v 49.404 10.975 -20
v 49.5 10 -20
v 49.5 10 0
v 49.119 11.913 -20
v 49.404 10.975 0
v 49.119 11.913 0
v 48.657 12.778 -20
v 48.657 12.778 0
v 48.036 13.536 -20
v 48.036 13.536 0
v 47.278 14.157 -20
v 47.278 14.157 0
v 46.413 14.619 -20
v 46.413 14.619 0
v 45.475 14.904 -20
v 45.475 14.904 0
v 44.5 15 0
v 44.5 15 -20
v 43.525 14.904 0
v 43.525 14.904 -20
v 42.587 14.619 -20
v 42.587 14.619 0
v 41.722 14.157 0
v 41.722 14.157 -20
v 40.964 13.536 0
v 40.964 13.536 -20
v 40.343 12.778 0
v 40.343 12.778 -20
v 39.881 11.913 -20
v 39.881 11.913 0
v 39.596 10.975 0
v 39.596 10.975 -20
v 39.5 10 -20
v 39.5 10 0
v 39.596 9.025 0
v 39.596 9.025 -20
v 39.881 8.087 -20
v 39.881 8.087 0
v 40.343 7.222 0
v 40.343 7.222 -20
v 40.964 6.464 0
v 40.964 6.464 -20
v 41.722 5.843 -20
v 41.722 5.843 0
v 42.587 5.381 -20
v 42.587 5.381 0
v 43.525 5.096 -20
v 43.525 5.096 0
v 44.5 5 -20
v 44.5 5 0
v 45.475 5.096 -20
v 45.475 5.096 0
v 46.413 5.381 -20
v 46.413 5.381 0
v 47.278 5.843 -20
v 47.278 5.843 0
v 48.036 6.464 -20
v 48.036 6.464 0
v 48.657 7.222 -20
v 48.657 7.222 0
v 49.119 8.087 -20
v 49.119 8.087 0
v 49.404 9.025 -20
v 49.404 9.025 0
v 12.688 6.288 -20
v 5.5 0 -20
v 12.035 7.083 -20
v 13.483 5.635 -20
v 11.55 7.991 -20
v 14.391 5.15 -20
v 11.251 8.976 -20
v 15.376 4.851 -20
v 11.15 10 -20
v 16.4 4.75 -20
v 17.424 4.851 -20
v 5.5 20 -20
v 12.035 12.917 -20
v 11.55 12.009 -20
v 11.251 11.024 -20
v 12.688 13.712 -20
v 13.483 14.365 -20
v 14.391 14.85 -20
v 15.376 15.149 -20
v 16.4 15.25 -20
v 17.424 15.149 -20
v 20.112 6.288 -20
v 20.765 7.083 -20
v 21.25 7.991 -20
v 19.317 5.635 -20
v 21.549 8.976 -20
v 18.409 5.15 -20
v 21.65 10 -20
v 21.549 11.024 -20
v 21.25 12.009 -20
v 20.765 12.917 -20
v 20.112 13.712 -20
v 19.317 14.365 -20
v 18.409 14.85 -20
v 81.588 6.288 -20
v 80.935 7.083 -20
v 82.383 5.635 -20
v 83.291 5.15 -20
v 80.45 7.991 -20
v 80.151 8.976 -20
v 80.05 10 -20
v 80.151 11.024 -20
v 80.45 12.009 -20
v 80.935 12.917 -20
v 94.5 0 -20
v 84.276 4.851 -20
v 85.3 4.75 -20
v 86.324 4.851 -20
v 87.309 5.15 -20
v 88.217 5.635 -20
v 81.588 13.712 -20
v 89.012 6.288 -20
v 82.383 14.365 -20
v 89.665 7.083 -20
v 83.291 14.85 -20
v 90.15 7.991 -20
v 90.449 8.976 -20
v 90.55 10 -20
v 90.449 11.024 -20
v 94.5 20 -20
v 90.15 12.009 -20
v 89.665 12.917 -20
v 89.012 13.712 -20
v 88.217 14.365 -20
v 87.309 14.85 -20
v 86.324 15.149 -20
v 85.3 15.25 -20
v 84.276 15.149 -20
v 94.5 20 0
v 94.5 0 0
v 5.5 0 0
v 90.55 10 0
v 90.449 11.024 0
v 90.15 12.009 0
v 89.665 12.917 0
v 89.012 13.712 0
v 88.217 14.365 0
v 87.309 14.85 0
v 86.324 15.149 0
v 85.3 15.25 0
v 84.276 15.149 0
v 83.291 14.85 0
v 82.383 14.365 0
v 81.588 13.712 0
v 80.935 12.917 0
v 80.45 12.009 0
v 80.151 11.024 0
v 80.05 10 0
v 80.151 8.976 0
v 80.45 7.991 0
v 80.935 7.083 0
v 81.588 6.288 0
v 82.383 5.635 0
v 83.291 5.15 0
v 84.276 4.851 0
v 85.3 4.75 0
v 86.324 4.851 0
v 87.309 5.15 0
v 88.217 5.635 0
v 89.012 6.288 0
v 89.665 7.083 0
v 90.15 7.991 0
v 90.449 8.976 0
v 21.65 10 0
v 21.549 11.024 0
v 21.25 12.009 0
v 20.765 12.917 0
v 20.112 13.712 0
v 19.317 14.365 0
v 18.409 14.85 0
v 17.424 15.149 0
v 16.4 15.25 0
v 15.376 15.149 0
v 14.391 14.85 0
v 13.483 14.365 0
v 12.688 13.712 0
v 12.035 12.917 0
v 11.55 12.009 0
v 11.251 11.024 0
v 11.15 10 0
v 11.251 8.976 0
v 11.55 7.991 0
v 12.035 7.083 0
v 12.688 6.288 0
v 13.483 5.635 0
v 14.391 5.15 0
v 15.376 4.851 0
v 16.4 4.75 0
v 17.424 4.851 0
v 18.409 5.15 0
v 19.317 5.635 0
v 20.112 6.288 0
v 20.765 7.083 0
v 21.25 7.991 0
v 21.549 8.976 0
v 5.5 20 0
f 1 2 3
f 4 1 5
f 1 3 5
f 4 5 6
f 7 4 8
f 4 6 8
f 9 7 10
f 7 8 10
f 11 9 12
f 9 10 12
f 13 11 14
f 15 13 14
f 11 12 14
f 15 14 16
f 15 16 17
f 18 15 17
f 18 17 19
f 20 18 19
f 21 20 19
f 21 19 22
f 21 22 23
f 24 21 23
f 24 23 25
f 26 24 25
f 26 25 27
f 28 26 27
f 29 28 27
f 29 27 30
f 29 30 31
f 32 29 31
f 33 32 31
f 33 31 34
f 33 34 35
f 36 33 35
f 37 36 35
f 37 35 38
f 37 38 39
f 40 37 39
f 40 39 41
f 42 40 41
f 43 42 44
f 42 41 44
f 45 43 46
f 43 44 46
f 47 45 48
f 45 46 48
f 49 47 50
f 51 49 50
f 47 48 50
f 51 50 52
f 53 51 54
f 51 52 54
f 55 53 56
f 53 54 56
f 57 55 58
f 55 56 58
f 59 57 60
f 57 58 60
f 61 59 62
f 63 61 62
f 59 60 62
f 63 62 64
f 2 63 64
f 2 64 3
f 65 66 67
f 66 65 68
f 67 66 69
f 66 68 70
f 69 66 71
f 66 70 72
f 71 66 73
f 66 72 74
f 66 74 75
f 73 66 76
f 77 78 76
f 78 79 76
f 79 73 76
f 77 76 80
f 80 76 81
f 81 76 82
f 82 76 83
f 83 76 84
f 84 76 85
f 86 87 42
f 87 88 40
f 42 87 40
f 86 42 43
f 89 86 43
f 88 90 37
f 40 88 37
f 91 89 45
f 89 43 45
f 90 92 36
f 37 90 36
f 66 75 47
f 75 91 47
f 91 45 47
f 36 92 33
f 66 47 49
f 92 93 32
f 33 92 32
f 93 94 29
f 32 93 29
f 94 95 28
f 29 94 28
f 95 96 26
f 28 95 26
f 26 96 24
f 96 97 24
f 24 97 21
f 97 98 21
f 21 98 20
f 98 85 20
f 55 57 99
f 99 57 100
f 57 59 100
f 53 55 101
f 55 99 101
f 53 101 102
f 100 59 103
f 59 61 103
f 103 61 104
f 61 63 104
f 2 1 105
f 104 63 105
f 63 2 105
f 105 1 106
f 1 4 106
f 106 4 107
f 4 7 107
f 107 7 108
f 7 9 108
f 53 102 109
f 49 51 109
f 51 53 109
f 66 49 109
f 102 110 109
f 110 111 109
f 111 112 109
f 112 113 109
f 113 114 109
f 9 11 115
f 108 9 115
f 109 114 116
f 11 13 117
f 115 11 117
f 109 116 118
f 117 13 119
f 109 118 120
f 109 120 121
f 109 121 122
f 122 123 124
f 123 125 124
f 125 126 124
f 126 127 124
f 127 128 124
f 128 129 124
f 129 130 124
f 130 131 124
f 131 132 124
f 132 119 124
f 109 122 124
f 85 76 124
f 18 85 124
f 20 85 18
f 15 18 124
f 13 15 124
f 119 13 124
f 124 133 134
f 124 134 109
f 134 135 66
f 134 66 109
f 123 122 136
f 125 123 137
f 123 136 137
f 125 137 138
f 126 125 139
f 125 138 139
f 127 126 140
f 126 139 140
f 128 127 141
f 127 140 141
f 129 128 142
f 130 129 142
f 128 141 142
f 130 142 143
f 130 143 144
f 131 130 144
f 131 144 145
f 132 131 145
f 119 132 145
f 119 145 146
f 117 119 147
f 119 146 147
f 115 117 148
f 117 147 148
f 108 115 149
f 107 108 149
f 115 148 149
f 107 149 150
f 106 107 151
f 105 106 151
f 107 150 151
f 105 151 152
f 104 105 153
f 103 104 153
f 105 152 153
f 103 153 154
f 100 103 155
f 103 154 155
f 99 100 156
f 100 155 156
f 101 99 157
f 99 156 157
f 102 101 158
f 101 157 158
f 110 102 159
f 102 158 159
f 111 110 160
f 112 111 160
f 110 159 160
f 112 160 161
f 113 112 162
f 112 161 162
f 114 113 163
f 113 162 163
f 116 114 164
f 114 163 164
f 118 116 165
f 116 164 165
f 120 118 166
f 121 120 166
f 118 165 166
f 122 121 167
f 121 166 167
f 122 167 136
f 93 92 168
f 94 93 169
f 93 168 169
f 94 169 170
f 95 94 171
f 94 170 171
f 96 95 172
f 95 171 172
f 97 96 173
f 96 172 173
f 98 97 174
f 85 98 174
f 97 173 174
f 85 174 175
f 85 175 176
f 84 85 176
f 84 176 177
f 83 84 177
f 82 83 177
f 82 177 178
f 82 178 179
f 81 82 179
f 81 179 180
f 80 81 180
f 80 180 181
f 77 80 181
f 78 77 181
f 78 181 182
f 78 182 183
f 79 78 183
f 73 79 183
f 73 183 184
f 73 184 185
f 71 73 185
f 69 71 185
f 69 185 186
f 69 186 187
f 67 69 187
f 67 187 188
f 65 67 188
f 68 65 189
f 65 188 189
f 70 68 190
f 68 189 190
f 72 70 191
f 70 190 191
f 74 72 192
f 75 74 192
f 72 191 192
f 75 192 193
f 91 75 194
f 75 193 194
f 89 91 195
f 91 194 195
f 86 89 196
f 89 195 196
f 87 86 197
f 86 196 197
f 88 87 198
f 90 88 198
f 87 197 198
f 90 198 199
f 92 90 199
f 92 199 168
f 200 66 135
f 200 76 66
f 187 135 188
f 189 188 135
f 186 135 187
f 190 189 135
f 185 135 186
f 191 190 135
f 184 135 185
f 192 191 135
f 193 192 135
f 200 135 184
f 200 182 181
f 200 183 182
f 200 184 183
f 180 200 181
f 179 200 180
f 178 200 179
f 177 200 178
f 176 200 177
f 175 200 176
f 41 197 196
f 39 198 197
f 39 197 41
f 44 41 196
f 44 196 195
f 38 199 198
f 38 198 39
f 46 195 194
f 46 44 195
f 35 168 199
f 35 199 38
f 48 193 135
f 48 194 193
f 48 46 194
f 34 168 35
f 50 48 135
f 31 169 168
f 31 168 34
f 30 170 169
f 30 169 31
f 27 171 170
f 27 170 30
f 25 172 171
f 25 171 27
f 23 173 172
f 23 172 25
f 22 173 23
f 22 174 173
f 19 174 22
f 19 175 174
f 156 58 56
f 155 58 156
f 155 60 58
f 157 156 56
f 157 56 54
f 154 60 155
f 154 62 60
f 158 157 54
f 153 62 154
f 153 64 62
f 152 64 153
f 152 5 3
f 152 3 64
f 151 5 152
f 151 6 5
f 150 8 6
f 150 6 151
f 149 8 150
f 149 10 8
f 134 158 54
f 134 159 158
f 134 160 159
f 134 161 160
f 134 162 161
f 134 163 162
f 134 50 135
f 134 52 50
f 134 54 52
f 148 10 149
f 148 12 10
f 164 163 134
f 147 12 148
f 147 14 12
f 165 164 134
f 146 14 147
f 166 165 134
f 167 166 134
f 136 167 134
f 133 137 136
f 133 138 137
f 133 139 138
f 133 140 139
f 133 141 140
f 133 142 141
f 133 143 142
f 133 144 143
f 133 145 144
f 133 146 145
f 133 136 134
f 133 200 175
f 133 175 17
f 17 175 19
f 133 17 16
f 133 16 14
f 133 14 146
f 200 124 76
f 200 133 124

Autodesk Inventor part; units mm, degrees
ref_plane "YZ Plane" through (0, 0, 0) normal (1, 0, 0) x (0, 1, 0)
ref_plane "XZ Plane" through (0, 0, 0) normal (0, 1, 0) x (-1, 0, 0)
ref_plane "XY Plane" through (0, 0, 0) normal (0, 0, 1) x (1, 0, 0)
sketch "Sketch1" plane through (0, 0, 0) normal (0, 0, 1) x (1, 0, 0)
  line L0 (0, 0) -> (100, 0)
  line L1 (100, 0) -> (100, 20)
  line L2 (100, 20) -> (0, 20)
  line L3 (0, 20) -> (0, 0)
  dimension "d0" = 100
  dimension "d1" = 20
extrude "Extrusion1" add sketch "Sketch1" against normal blind 20
sketch "Sketch2" plane through (0, 0, 0) normal (0, 0, 1) x (1, 0, 0)
  line L0 (0, 0) -> (0, 20) projected
  circle A0 centre (44.5, 10) radius 5
  line L1 (0, 0) -> (100, 0) projected
  dimension "d5" = 10
  dimension "d24" = 44.5
  dimension "d25" = 10
sketch "Sketch3" plane through (0, 0, 0) normal (0, 0, 1) x (1, 0, 0)
  line L0 (0, 0) -> (0, 20) projected
  line L1 (100, 20) -> (100, 0) projected
  line L2 (100, 10) -> (85.3, 10)
  circle A0 centre (85.3, 10) radius 5.25
  dimension "d8" = 14.7
  dimension "d9" = 10.5
extrude "Extrusion2" cut sketch "Sketch3" against normal blind 20
extrude "Extrusion3" cut sketch "Sketch2" against normal blind 20
sketch "Sketch4" plane through (0, 0, 0) normal (0, 0, 1) x (1, 0, 0)
  line L0 (0, 20) -> (0, 0) projected
  circle A0 centre (16.4, 10) radius 5.25
  circle A1 centre (44.5, 10) radius 5 projected
  line L1 (0, 0) -> (100, 0) projected
  dimension "d15" = 10.5
  dimension "d27" = 10
  dimension "d29" = 16.4
extrude "Extrusion4" cut sketch "Sketch4" against normal blind 20 contours A0
sketch "Sketch5" plane through (0, 0, 0) normal (0, 0, 1) x (1, 0, 0)
  point P0 (0, 0)
sketch "Sketch6" plane through (100, 0, 0) normal (1, 0, 0) x (0, 0, -1)
  line L0 (0, 0) -> (20, 0) projected
  line L1 (20, 0) -> (20, 20) projected
  line L2 (0, 0) -> (20, 0)
  line L3 (20, 0) -> (20, 20)
  line L4 (20, 20) -> (0, 20)
  line L5 (0, 20) -> (0, 0)
extrude "Extrusion5" cut sketch "Sketch6" against normal blind 5.5
sketch "Sketch7" plane through (0, 0, 0) normal (-1, 0, 0) x (0, 0, 1)
  line L0 (-20, 0) -> (-20, 20) projected
  line L1 (0, 20) -> (-20, 20) projected
  line L2 (-20, 0) -> (0, 0)
  line L3 (0, 0) -> (0, 20)
  line L4 (0, 20) -> (-20, 20)
  line L5 (-20, 20) -> (-20, 0)
extrude "Extrusion6" cut sketch "Sketch7" against normal blind 5.5
thread "Thread1" size "M10x1.5" class "6H" standard "ANSI Metric M Profile" full length
properties part number "block"
